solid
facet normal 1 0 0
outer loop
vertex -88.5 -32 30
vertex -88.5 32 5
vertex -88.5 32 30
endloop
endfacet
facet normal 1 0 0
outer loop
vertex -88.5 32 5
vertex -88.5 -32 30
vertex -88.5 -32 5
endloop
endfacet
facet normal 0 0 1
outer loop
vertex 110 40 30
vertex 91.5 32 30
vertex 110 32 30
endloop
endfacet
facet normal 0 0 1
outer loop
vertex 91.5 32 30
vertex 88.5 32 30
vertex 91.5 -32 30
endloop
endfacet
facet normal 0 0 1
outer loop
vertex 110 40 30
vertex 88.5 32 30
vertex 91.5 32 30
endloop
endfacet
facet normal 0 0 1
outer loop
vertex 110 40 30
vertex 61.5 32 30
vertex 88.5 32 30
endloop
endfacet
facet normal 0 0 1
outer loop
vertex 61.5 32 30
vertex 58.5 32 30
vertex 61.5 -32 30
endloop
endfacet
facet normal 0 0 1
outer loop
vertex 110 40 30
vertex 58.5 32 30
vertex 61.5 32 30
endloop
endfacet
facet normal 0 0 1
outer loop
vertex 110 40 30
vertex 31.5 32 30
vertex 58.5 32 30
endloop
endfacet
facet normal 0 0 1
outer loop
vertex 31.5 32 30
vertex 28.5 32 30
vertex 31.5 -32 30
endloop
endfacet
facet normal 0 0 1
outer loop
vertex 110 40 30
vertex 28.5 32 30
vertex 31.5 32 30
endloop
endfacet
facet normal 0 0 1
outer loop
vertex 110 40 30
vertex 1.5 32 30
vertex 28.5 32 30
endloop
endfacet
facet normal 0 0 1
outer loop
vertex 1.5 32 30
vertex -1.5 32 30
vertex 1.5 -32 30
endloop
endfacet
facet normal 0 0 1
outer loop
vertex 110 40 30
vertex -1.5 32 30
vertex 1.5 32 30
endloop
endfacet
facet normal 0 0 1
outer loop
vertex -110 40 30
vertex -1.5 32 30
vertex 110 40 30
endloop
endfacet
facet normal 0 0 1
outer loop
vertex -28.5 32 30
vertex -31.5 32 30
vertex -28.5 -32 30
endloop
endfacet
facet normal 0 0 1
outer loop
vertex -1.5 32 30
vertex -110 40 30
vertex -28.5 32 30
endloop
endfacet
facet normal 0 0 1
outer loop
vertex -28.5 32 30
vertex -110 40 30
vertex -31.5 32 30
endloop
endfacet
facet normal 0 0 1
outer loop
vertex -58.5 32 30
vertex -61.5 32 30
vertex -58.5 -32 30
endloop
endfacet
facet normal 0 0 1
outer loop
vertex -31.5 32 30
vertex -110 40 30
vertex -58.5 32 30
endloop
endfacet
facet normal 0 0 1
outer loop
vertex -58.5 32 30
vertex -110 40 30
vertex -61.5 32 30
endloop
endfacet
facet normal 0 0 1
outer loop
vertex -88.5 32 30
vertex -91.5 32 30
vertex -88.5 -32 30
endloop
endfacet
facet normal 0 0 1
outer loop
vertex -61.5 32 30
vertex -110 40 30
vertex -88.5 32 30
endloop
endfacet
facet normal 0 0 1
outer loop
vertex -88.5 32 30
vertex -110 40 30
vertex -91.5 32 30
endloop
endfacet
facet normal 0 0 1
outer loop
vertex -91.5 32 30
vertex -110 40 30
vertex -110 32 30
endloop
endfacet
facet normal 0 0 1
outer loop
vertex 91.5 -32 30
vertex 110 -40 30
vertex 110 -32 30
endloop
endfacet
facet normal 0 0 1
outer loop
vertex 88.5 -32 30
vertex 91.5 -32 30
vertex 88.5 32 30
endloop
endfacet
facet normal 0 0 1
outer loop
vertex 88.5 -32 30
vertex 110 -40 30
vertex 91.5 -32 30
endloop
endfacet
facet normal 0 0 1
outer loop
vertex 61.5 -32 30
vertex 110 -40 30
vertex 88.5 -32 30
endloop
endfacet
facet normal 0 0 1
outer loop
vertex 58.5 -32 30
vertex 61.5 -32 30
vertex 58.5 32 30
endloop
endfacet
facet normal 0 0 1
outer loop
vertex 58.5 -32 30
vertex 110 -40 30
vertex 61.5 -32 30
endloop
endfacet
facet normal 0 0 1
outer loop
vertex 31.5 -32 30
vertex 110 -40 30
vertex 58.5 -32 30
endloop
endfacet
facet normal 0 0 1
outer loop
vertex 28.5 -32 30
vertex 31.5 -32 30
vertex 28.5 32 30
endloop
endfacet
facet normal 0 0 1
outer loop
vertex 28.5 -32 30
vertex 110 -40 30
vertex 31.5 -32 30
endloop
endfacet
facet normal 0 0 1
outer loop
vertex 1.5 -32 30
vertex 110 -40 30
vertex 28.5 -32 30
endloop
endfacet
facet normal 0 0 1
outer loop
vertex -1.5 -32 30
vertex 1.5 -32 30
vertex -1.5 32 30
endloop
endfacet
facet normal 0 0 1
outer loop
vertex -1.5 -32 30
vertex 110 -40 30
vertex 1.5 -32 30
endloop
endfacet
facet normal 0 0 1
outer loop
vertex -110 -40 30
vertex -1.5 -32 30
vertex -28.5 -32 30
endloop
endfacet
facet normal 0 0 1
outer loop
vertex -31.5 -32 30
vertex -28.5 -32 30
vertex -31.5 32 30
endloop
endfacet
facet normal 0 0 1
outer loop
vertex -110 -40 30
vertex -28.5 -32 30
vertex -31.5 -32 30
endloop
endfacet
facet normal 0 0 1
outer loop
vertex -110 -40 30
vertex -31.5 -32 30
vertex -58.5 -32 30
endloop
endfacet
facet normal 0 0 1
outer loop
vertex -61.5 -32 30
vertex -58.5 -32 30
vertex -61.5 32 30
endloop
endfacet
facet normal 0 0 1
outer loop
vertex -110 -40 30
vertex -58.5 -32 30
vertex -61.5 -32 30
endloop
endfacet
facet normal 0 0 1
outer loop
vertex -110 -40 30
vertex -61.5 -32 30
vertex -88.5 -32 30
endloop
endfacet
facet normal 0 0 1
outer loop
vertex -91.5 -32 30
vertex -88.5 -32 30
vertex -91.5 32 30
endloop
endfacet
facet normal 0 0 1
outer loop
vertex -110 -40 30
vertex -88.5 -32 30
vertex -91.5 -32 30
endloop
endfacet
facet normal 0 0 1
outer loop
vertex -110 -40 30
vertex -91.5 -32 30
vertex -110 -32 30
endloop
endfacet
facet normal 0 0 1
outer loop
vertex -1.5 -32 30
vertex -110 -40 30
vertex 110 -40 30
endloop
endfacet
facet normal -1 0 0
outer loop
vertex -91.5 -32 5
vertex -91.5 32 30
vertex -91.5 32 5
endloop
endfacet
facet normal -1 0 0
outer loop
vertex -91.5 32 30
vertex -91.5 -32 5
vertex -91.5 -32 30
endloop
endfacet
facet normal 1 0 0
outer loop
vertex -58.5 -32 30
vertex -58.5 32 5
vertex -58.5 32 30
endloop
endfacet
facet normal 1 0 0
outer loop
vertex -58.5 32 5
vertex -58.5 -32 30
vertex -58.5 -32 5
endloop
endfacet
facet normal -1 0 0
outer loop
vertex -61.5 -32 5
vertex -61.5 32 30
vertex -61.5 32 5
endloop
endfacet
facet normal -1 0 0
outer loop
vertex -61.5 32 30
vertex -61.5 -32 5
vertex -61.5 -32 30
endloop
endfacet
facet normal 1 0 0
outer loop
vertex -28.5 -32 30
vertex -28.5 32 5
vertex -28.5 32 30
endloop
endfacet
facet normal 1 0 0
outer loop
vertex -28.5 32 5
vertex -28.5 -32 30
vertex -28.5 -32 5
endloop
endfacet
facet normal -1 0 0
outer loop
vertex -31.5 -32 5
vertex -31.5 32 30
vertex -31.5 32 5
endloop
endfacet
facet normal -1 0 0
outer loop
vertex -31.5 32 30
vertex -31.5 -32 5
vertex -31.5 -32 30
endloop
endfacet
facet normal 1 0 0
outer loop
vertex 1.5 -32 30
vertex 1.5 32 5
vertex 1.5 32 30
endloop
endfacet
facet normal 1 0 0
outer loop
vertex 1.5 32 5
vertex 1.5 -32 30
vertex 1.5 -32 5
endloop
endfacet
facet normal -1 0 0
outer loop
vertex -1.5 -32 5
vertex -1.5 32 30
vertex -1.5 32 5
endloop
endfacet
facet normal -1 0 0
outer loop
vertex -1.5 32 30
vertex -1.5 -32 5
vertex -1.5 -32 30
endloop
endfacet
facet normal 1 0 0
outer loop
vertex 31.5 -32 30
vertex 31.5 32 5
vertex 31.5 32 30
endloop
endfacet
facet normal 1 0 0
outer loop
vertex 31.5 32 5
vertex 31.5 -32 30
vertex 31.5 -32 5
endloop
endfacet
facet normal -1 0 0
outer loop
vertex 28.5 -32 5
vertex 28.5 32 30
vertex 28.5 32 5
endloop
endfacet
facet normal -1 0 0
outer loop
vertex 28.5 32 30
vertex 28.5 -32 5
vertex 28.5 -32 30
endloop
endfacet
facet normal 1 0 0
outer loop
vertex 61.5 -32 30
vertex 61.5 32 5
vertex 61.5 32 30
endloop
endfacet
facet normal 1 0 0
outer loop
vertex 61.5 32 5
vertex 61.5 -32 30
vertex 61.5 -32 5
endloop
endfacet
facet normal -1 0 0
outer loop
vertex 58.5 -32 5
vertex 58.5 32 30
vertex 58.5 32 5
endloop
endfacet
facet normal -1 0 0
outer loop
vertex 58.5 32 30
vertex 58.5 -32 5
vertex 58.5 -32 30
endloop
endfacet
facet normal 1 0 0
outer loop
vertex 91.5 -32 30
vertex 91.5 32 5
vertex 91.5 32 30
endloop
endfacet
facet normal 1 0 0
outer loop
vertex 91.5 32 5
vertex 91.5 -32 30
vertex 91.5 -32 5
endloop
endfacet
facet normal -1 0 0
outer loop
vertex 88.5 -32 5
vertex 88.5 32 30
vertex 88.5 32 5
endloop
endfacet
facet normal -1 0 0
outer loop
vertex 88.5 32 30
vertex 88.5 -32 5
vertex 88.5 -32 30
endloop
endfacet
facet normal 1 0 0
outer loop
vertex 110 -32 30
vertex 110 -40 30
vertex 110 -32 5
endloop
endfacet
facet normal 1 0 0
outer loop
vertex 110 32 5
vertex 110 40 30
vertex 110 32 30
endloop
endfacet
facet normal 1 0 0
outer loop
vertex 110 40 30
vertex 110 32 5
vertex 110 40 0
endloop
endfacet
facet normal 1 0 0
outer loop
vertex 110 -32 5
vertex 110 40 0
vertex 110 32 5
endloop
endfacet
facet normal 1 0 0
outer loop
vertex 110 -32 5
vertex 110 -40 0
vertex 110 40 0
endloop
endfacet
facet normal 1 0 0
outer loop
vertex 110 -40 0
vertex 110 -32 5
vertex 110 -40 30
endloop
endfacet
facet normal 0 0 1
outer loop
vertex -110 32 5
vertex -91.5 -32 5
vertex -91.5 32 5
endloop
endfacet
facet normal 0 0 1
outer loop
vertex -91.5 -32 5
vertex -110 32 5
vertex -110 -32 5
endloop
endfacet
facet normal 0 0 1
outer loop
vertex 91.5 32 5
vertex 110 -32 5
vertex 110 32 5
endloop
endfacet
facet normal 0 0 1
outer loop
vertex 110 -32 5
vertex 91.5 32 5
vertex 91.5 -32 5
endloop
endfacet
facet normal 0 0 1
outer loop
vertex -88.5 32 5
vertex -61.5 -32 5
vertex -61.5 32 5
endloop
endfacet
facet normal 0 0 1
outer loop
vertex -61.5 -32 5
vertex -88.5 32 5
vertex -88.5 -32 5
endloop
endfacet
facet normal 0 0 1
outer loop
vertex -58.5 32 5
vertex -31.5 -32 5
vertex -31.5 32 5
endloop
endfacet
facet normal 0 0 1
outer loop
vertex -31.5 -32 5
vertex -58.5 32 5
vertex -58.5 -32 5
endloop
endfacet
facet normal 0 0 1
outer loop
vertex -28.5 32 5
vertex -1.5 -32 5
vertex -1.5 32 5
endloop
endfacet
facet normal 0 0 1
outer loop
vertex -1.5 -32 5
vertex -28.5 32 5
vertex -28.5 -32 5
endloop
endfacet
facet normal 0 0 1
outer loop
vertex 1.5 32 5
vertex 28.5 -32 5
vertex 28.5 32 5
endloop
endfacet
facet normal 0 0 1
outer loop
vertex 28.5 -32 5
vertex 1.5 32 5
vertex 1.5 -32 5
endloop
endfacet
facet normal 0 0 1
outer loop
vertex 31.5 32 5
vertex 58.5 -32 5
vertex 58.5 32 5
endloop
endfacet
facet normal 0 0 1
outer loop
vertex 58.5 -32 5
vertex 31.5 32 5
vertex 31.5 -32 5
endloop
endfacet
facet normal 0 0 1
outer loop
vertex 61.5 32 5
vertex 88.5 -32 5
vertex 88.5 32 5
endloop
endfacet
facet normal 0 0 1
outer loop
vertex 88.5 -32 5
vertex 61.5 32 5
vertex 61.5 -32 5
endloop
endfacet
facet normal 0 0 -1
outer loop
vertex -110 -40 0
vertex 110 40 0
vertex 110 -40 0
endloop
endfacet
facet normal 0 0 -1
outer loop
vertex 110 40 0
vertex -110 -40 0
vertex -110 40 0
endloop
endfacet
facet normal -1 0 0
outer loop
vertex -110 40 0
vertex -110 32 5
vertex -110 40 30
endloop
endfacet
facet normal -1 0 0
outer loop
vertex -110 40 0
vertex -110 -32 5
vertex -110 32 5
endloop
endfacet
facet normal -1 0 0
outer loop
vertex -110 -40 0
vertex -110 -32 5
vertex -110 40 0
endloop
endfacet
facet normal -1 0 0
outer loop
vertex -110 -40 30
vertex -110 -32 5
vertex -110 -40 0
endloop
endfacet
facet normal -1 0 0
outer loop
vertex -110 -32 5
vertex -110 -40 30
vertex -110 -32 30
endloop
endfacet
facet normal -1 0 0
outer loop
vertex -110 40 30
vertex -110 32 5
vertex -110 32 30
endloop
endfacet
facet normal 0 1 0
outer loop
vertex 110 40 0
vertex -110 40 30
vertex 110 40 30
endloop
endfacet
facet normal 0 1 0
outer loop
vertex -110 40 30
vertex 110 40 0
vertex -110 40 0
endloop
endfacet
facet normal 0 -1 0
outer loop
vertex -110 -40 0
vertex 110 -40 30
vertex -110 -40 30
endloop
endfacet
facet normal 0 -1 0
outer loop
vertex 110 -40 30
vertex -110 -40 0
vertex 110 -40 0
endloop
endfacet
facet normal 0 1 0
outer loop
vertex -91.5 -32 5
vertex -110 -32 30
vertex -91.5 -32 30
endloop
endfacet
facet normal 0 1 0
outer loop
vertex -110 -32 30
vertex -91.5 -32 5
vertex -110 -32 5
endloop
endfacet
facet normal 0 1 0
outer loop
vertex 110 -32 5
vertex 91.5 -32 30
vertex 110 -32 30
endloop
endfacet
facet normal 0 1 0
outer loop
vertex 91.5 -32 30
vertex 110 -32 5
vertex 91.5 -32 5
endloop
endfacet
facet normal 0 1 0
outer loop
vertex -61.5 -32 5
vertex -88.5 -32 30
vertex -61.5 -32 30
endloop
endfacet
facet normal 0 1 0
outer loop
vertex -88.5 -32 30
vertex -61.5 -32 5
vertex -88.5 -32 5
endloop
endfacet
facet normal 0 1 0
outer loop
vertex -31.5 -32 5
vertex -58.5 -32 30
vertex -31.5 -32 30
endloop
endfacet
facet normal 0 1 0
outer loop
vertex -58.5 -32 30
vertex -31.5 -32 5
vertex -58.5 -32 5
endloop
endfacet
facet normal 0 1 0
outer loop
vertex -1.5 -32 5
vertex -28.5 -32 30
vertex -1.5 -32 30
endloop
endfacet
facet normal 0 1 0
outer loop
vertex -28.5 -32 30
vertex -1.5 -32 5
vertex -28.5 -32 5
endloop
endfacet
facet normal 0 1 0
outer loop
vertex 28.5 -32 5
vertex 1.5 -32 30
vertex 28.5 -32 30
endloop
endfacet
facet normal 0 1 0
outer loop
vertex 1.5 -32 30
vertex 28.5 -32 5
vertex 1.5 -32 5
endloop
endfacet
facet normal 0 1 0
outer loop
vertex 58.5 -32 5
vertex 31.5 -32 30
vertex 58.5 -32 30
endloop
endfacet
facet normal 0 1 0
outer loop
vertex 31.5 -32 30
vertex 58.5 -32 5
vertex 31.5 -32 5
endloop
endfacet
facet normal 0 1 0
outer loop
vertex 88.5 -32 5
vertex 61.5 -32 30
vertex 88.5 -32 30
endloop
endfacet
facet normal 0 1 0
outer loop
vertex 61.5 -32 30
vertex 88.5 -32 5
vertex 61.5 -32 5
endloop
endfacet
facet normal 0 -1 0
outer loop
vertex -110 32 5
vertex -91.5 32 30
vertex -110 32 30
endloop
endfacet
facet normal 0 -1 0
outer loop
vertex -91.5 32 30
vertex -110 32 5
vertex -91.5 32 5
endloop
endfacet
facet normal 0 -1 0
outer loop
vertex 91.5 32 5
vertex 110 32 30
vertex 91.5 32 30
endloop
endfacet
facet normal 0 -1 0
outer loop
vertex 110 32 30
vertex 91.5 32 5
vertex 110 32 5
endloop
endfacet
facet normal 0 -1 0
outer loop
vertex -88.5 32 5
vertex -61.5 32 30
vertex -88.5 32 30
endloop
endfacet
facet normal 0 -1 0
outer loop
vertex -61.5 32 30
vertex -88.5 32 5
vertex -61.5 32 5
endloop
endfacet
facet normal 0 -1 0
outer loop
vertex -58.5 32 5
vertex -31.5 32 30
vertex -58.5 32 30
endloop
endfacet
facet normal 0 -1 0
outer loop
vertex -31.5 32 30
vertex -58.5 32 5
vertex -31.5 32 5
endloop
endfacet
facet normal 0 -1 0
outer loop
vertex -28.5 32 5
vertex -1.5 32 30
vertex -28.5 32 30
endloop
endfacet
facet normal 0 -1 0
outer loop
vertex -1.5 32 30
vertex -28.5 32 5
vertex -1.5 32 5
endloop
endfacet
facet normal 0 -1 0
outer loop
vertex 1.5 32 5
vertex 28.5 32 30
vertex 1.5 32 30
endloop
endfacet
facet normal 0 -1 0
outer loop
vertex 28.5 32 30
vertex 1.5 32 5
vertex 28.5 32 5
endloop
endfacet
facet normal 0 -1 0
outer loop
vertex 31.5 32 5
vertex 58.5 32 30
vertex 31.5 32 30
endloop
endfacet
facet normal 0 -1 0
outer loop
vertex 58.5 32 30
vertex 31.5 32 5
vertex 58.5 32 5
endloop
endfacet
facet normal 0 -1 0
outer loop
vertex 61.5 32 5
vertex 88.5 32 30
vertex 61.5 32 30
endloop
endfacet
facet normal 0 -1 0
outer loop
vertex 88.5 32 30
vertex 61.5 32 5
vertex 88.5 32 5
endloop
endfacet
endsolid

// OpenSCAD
$fn = 32;

// ----------------------------------------------------------------------
// Rib frame 220 x 80 x 30
// 7 ribs at 30 mm pitch
// ----------------------------------------------------------------------

// --- parameters (mm) ---
frame = [220, 80, 5];  // base plate size (x, y, z)
rail_w = 8;            // side rail width
ribs = 7;              // number of ribs
rib_t = 3;             // rib thickness
rib_h = 25;            // rib height above the base plate
pitch = 30;            // pitch between rib centres

// --- derived feature positions (mm) ---
span = (ribs - 1) * pitch;          // = 180   distance between the outer ribs
origin_x = -span / 2;               // = -90   X of the first rib
rib_len = frame[1] - 2 * rail_w + 2;  // = 66   rib length, 1 mm into each rail
feature_centers = [
  [origin_x + 0 * pitch, 0],
  [origin_x + 1 * pitch, 0],
  [origin_x + 2 * pitch, 0],
  [origin_x + 3 * pitch, 0],
  [origin_x + 4 * pitch, 0],
  [origin_x + 5 * pitch, 0],
  [origin_x + 6 * pitch, 0]
];   // rib centre line, drives the rib loop

// base plate, two side rails, then the ribs read straight off feature_centers
union() {
  translate([-frame[0] / 2, -frame[1] / 2, 0]) cube(frame);
  translate([-frame[0] / 2, -frame[1] / 2, 0]) cube([frame[0], rail_w, frame[2] + rib_h]);
  translate([-frame[0] / 2, frame[1] / 2 - rail_w, 0]) cube([frame[0], rail_w, frame[2] + rib_h]);
  for (centre = feature_centers)
    translate([centre[0] - rib_t / 2, centre[1] - rib_len / 2, frame[2] - 1])
      cube([rib_t, rib_len, rib_h + 1]);
}
